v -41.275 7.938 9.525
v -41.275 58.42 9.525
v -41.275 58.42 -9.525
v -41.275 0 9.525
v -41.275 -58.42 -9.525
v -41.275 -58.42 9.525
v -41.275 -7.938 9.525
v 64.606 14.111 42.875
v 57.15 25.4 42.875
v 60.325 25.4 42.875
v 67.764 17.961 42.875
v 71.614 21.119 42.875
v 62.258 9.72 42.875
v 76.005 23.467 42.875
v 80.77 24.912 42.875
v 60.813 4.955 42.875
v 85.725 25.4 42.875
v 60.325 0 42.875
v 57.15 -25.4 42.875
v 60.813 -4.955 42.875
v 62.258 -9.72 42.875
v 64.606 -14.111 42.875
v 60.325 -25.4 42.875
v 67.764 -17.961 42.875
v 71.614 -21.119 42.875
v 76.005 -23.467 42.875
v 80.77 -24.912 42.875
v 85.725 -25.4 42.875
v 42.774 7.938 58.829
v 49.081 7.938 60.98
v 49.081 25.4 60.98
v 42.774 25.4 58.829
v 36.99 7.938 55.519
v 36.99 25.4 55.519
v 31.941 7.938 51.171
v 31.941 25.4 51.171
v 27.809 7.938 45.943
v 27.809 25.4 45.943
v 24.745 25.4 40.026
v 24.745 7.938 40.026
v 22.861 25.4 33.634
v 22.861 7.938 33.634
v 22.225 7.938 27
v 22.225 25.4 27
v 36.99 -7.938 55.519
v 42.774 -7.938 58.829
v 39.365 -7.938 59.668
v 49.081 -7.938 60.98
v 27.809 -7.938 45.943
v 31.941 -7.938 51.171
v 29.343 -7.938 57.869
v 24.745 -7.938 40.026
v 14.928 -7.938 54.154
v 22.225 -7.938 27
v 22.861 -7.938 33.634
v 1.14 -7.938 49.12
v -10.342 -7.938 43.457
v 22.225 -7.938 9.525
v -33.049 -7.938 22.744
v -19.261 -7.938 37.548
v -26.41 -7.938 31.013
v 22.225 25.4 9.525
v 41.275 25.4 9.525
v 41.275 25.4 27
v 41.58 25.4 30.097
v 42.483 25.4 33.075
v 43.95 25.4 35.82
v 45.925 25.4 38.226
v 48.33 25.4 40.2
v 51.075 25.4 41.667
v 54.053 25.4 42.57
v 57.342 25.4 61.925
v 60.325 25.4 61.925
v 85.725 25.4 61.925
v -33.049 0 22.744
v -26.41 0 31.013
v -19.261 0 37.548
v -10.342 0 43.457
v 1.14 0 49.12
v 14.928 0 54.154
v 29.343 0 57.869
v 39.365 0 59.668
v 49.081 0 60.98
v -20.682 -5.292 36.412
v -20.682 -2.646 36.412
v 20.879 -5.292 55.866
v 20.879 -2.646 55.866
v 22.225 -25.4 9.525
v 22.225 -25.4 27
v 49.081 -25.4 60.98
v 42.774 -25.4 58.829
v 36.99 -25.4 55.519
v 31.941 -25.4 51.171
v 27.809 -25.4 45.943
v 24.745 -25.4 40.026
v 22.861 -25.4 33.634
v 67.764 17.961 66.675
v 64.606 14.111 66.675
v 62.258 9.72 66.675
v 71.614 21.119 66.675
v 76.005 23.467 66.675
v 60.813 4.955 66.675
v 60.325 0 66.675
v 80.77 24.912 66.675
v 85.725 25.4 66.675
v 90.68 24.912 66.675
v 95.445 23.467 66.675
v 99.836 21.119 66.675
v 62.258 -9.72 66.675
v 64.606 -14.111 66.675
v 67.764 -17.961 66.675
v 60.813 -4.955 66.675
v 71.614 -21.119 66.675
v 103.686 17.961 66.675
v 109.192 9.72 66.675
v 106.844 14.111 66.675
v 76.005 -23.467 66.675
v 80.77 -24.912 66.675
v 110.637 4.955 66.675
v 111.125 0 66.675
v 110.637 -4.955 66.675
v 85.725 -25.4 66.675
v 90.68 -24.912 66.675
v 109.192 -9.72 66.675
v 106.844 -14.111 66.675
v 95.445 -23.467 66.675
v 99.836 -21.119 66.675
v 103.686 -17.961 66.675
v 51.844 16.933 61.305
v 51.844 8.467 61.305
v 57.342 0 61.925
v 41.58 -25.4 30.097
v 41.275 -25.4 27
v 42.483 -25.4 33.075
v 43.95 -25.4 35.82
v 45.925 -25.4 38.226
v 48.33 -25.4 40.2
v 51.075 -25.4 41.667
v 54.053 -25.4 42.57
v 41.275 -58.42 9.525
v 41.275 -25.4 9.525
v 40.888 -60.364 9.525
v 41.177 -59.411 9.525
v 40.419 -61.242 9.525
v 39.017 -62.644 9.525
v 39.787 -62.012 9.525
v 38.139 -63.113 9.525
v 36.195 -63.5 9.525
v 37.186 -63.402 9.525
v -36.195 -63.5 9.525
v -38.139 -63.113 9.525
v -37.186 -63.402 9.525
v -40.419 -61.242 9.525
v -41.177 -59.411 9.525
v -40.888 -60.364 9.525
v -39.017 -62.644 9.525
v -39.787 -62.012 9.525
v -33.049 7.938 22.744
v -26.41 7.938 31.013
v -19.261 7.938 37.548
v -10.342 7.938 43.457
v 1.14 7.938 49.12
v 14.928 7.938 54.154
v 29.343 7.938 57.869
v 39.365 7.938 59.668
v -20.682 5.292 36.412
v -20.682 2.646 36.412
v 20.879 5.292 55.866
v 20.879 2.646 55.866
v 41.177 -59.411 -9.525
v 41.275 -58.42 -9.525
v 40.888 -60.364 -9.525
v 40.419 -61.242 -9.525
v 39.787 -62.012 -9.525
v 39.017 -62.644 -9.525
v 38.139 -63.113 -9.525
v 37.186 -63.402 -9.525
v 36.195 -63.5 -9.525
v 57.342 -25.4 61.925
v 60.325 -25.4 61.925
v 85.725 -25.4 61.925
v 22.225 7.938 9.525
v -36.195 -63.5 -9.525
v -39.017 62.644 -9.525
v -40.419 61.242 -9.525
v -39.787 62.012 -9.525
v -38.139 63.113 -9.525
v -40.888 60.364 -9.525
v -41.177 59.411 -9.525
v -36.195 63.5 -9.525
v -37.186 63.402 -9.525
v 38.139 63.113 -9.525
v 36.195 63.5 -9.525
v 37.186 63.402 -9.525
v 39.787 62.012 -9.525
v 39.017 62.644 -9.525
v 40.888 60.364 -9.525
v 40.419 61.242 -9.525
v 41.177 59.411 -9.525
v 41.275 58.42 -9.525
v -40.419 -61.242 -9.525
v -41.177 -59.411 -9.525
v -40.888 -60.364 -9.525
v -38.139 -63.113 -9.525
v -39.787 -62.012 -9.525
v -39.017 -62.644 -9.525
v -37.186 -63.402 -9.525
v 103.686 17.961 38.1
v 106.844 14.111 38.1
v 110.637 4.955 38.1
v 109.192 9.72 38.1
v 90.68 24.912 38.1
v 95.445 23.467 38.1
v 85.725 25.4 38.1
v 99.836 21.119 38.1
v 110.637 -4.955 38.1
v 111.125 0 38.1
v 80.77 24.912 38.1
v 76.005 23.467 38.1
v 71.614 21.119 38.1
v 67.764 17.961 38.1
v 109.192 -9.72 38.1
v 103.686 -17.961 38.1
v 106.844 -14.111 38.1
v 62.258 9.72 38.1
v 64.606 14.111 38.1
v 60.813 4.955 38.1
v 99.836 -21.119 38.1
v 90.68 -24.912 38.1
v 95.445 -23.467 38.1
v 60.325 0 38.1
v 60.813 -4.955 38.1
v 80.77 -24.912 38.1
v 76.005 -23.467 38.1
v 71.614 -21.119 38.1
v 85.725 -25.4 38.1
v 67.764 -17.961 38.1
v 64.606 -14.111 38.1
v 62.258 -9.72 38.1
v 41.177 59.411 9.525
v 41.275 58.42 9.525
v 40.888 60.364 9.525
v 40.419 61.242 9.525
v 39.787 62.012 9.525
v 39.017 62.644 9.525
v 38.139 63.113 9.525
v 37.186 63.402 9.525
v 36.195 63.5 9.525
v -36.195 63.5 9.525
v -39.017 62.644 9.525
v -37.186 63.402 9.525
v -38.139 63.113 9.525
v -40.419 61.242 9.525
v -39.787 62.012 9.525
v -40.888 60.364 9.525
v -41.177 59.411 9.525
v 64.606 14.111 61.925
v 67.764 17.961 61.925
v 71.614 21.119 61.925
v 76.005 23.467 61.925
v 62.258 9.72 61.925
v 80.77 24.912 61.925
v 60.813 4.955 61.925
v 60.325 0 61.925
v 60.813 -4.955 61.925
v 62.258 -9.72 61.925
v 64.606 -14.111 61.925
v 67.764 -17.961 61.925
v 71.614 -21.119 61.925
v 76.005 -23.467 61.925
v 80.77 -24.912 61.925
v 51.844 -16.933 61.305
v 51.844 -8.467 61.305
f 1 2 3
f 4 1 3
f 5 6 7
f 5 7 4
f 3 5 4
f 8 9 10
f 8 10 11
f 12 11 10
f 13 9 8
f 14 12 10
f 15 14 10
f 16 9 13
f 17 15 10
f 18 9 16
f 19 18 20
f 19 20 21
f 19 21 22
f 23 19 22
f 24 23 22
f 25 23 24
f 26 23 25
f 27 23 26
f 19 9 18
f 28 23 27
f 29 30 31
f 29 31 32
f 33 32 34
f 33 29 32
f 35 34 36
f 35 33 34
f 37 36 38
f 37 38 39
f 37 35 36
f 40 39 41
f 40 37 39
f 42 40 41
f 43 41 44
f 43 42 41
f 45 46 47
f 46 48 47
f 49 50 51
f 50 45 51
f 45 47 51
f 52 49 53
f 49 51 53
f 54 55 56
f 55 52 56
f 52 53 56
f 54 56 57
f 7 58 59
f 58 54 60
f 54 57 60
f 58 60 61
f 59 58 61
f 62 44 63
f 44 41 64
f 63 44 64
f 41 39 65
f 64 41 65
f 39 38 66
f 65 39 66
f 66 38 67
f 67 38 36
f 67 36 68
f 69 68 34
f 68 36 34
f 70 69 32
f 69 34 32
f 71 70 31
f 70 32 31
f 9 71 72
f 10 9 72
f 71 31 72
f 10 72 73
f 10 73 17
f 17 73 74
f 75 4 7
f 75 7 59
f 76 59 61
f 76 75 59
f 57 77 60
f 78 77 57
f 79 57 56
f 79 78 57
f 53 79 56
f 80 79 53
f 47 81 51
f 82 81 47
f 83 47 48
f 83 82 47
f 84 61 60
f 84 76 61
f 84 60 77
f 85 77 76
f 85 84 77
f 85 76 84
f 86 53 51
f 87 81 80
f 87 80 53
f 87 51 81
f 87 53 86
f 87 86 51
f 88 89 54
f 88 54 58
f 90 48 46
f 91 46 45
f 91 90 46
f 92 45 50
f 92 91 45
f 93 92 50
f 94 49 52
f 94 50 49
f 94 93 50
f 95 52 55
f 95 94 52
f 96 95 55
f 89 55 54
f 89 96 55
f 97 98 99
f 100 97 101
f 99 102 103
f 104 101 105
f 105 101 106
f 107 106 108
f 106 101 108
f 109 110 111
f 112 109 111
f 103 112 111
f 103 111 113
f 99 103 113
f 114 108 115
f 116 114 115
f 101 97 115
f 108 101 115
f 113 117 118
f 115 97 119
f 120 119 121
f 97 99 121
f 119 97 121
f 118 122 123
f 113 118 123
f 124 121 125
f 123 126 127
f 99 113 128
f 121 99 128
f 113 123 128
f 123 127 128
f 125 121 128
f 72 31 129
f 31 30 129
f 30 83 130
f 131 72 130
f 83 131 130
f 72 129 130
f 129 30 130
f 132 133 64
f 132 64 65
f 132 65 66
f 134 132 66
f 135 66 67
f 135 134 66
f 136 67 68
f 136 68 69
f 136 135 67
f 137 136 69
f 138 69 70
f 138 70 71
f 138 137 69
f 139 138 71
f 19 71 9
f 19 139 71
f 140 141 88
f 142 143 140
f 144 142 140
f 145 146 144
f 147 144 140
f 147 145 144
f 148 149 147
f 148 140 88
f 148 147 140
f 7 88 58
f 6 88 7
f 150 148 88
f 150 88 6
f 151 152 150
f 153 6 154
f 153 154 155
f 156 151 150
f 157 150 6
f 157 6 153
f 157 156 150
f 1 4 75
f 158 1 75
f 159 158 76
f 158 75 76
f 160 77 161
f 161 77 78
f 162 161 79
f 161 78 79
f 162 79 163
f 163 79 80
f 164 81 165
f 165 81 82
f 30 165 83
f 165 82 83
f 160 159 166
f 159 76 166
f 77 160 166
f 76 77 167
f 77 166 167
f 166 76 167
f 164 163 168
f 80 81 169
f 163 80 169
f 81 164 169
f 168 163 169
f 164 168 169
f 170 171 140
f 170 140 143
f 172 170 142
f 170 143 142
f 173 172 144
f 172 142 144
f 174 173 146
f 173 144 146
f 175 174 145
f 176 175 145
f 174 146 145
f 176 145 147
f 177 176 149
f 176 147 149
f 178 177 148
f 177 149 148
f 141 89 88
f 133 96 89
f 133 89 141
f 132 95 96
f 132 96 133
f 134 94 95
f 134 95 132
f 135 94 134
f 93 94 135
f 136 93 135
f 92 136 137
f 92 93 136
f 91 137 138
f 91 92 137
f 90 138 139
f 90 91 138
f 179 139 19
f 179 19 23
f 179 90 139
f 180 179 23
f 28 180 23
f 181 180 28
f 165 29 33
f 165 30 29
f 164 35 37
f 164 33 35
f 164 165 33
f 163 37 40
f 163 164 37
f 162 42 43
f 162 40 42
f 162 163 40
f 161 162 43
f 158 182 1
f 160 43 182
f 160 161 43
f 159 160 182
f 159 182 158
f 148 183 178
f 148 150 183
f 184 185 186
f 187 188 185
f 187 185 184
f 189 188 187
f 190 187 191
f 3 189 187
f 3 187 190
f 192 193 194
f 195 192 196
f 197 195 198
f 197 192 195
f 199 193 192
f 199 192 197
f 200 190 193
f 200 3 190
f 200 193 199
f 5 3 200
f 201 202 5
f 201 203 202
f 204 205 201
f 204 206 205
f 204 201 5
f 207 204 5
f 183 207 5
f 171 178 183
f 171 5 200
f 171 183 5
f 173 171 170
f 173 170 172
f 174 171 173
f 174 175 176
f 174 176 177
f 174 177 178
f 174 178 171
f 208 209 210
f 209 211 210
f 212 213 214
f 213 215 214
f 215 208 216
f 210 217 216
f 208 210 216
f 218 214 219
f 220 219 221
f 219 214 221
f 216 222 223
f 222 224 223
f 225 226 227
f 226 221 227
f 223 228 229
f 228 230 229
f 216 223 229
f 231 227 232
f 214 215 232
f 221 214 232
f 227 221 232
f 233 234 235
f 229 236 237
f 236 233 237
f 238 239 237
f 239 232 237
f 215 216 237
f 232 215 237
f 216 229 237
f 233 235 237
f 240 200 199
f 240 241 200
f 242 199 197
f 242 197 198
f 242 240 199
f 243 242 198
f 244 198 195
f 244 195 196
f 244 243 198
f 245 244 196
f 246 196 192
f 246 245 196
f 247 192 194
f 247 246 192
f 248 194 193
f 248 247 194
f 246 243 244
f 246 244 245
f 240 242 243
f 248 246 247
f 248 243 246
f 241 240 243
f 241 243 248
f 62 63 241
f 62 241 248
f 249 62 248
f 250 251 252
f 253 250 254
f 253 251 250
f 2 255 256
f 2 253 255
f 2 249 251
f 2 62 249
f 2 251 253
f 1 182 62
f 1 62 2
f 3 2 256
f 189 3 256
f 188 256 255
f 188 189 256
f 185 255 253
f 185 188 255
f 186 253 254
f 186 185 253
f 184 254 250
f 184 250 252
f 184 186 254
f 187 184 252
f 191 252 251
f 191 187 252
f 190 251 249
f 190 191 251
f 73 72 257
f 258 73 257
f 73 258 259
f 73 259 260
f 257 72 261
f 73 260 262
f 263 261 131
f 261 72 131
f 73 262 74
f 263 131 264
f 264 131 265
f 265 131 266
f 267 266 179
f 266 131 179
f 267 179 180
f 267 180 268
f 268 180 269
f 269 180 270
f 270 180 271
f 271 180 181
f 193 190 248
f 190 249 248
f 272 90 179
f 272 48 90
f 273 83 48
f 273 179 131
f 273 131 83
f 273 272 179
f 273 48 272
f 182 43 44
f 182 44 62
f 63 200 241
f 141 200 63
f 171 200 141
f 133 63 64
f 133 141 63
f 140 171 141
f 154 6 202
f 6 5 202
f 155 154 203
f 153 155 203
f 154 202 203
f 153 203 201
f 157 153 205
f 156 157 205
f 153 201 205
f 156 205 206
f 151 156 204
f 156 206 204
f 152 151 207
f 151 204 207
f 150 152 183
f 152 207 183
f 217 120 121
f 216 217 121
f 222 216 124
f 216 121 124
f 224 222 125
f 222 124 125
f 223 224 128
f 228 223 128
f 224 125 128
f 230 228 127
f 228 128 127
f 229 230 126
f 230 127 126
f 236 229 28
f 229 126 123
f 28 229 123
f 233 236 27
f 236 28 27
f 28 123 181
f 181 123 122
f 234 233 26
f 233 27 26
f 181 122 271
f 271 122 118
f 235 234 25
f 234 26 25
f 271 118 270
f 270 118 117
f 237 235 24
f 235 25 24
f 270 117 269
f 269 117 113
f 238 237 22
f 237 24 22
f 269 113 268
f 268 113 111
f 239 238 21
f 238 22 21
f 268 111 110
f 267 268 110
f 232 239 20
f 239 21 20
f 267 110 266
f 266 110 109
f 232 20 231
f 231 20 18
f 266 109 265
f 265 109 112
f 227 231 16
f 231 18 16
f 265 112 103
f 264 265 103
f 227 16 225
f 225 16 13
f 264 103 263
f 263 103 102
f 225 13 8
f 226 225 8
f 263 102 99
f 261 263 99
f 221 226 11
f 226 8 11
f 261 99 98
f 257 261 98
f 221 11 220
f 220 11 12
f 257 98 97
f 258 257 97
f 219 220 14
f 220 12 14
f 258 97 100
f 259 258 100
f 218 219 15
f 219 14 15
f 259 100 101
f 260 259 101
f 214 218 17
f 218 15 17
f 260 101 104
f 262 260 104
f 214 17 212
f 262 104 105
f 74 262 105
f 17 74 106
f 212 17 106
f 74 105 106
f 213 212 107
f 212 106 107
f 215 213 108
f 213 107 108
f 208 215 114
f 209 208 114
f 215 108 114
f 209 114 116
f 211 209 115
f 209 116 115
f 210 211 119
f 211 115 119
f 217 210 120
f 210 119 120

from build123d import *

# Parameters (mm, degrees)
F1_DEPTH = 63.5
F0_W     = 25.4
F0_H     = 19.0494729435
F2_DEPTH = 25.4
F3_DEPTH = 7.9375
F5_R     = 5.08


with BuildPart() as f1:
    # F0 (on Front) → F1 (new body, symmetric)
    with BuildSketch(Plane.XZ):
        Polygon((-41.275, -9.525), (41.275, -9.525), (41.275, 9.525), (22.225, 9.525), (-41.275, 9.525), align=None)
    extrude(amount=F1_DEPTH, both=True)

    # F0 (on Front) → F2 (join, symmetric)
    with BuildSketch(Plane.XZ):
        with BuildLine():
            Line((22.225, 9.525), (41.275, 9.525))
            Line((41.275, 9.525), (41.275, 27.0002))
            ThreePointArc((41.275, 27.0002), (45.9246798487, 38.2255201513), (57.15, 42.8752))
            Line((57.15, 42.8752), (60.325, 42.8752))
            Line((60.325, 42.8752), (60.325, 61.9246729435))
            Line((60.325, 61.9246729435), (57.3418713593, 61.9246729435))
            add(Edge.make_bspline(
                [(49.0812338438, 60.9803506429), (51.8498488653, 61.3134633904), (54.5982729036, 61.6187718243), (57.3418713593, 61.9246729435)],
                knots=[0.9234728765, 0.9234728765, 0.9234728765, 0.9234728765, 1, 1, 1, 1], degree=3))
            ThreePointArc((49.0812338438, 60.9803506429), (29.7496598287, 48.6560764195), (22.225, 27.0002))
            Line((22.225, 27.0002), (22.225, 9.525))
        make_face()
        with Locations((73.025, 52.3999364718)):
            Rectangle(F0_W, F0_H)
    extrude(amount=F2_DEPTH, both=True)

    # F0 (on Front) → F3 (join, symmetric)
    with BuildSketch(Plane.XZ):
        with BuildLine():
            add(Edge.make_bspline(
                [(-41.275, 9.525), (-35.6876151592, 19.084335553), (-23.5641065751, 39.7994014349), (17.4108050565, 56.5096118561), (40.0708590665, 59.8962451699), (49.0812338438, 60.9803506429)],
                knots=[0, 0, 0, 0, 0.3116488423, 0.6744176422, 0.9234728765, 0.9234728765, 0.9234728765, 0.9234728765], degree=3))
            Line((-41.275, 9.525), (22.225, 9.525))
            Line((22.225, 9.525), (22.225, 27.0002))
            ThreePointArc((22.225, 27.0002), (29.7496598287, 48.6560764195), (49.0812338438, 60.9803506429))
        make_face()
    extrude(amount=F3_DEPTH, both=True)

    # F0 (on Front) → F4 (revolve)
    with BuildSketch(Plane.XZ):
        Polygon((85.725, 61.9246729435), (85.725, 42.8752), (85.725, 38.1), (111.125, 38.1), (111.125, 66.675), (85.725, 66.675), align=None)
    revolve(axis=Axis((85.725, 0, 52.3875), (0, 0, -1)))

    # F5
    f5_edges = [f1.edges().sort_by_distance(p)[0] for p in [
        (41.275, -63.5, 0),
        (-41.275, -63.5, 0),
        (-41.275, 63.5, 0),
        (41.275, 63.5, 0),
    ]]
    fillet(f5_edges, radius=F5_R)


solid = f1.part
